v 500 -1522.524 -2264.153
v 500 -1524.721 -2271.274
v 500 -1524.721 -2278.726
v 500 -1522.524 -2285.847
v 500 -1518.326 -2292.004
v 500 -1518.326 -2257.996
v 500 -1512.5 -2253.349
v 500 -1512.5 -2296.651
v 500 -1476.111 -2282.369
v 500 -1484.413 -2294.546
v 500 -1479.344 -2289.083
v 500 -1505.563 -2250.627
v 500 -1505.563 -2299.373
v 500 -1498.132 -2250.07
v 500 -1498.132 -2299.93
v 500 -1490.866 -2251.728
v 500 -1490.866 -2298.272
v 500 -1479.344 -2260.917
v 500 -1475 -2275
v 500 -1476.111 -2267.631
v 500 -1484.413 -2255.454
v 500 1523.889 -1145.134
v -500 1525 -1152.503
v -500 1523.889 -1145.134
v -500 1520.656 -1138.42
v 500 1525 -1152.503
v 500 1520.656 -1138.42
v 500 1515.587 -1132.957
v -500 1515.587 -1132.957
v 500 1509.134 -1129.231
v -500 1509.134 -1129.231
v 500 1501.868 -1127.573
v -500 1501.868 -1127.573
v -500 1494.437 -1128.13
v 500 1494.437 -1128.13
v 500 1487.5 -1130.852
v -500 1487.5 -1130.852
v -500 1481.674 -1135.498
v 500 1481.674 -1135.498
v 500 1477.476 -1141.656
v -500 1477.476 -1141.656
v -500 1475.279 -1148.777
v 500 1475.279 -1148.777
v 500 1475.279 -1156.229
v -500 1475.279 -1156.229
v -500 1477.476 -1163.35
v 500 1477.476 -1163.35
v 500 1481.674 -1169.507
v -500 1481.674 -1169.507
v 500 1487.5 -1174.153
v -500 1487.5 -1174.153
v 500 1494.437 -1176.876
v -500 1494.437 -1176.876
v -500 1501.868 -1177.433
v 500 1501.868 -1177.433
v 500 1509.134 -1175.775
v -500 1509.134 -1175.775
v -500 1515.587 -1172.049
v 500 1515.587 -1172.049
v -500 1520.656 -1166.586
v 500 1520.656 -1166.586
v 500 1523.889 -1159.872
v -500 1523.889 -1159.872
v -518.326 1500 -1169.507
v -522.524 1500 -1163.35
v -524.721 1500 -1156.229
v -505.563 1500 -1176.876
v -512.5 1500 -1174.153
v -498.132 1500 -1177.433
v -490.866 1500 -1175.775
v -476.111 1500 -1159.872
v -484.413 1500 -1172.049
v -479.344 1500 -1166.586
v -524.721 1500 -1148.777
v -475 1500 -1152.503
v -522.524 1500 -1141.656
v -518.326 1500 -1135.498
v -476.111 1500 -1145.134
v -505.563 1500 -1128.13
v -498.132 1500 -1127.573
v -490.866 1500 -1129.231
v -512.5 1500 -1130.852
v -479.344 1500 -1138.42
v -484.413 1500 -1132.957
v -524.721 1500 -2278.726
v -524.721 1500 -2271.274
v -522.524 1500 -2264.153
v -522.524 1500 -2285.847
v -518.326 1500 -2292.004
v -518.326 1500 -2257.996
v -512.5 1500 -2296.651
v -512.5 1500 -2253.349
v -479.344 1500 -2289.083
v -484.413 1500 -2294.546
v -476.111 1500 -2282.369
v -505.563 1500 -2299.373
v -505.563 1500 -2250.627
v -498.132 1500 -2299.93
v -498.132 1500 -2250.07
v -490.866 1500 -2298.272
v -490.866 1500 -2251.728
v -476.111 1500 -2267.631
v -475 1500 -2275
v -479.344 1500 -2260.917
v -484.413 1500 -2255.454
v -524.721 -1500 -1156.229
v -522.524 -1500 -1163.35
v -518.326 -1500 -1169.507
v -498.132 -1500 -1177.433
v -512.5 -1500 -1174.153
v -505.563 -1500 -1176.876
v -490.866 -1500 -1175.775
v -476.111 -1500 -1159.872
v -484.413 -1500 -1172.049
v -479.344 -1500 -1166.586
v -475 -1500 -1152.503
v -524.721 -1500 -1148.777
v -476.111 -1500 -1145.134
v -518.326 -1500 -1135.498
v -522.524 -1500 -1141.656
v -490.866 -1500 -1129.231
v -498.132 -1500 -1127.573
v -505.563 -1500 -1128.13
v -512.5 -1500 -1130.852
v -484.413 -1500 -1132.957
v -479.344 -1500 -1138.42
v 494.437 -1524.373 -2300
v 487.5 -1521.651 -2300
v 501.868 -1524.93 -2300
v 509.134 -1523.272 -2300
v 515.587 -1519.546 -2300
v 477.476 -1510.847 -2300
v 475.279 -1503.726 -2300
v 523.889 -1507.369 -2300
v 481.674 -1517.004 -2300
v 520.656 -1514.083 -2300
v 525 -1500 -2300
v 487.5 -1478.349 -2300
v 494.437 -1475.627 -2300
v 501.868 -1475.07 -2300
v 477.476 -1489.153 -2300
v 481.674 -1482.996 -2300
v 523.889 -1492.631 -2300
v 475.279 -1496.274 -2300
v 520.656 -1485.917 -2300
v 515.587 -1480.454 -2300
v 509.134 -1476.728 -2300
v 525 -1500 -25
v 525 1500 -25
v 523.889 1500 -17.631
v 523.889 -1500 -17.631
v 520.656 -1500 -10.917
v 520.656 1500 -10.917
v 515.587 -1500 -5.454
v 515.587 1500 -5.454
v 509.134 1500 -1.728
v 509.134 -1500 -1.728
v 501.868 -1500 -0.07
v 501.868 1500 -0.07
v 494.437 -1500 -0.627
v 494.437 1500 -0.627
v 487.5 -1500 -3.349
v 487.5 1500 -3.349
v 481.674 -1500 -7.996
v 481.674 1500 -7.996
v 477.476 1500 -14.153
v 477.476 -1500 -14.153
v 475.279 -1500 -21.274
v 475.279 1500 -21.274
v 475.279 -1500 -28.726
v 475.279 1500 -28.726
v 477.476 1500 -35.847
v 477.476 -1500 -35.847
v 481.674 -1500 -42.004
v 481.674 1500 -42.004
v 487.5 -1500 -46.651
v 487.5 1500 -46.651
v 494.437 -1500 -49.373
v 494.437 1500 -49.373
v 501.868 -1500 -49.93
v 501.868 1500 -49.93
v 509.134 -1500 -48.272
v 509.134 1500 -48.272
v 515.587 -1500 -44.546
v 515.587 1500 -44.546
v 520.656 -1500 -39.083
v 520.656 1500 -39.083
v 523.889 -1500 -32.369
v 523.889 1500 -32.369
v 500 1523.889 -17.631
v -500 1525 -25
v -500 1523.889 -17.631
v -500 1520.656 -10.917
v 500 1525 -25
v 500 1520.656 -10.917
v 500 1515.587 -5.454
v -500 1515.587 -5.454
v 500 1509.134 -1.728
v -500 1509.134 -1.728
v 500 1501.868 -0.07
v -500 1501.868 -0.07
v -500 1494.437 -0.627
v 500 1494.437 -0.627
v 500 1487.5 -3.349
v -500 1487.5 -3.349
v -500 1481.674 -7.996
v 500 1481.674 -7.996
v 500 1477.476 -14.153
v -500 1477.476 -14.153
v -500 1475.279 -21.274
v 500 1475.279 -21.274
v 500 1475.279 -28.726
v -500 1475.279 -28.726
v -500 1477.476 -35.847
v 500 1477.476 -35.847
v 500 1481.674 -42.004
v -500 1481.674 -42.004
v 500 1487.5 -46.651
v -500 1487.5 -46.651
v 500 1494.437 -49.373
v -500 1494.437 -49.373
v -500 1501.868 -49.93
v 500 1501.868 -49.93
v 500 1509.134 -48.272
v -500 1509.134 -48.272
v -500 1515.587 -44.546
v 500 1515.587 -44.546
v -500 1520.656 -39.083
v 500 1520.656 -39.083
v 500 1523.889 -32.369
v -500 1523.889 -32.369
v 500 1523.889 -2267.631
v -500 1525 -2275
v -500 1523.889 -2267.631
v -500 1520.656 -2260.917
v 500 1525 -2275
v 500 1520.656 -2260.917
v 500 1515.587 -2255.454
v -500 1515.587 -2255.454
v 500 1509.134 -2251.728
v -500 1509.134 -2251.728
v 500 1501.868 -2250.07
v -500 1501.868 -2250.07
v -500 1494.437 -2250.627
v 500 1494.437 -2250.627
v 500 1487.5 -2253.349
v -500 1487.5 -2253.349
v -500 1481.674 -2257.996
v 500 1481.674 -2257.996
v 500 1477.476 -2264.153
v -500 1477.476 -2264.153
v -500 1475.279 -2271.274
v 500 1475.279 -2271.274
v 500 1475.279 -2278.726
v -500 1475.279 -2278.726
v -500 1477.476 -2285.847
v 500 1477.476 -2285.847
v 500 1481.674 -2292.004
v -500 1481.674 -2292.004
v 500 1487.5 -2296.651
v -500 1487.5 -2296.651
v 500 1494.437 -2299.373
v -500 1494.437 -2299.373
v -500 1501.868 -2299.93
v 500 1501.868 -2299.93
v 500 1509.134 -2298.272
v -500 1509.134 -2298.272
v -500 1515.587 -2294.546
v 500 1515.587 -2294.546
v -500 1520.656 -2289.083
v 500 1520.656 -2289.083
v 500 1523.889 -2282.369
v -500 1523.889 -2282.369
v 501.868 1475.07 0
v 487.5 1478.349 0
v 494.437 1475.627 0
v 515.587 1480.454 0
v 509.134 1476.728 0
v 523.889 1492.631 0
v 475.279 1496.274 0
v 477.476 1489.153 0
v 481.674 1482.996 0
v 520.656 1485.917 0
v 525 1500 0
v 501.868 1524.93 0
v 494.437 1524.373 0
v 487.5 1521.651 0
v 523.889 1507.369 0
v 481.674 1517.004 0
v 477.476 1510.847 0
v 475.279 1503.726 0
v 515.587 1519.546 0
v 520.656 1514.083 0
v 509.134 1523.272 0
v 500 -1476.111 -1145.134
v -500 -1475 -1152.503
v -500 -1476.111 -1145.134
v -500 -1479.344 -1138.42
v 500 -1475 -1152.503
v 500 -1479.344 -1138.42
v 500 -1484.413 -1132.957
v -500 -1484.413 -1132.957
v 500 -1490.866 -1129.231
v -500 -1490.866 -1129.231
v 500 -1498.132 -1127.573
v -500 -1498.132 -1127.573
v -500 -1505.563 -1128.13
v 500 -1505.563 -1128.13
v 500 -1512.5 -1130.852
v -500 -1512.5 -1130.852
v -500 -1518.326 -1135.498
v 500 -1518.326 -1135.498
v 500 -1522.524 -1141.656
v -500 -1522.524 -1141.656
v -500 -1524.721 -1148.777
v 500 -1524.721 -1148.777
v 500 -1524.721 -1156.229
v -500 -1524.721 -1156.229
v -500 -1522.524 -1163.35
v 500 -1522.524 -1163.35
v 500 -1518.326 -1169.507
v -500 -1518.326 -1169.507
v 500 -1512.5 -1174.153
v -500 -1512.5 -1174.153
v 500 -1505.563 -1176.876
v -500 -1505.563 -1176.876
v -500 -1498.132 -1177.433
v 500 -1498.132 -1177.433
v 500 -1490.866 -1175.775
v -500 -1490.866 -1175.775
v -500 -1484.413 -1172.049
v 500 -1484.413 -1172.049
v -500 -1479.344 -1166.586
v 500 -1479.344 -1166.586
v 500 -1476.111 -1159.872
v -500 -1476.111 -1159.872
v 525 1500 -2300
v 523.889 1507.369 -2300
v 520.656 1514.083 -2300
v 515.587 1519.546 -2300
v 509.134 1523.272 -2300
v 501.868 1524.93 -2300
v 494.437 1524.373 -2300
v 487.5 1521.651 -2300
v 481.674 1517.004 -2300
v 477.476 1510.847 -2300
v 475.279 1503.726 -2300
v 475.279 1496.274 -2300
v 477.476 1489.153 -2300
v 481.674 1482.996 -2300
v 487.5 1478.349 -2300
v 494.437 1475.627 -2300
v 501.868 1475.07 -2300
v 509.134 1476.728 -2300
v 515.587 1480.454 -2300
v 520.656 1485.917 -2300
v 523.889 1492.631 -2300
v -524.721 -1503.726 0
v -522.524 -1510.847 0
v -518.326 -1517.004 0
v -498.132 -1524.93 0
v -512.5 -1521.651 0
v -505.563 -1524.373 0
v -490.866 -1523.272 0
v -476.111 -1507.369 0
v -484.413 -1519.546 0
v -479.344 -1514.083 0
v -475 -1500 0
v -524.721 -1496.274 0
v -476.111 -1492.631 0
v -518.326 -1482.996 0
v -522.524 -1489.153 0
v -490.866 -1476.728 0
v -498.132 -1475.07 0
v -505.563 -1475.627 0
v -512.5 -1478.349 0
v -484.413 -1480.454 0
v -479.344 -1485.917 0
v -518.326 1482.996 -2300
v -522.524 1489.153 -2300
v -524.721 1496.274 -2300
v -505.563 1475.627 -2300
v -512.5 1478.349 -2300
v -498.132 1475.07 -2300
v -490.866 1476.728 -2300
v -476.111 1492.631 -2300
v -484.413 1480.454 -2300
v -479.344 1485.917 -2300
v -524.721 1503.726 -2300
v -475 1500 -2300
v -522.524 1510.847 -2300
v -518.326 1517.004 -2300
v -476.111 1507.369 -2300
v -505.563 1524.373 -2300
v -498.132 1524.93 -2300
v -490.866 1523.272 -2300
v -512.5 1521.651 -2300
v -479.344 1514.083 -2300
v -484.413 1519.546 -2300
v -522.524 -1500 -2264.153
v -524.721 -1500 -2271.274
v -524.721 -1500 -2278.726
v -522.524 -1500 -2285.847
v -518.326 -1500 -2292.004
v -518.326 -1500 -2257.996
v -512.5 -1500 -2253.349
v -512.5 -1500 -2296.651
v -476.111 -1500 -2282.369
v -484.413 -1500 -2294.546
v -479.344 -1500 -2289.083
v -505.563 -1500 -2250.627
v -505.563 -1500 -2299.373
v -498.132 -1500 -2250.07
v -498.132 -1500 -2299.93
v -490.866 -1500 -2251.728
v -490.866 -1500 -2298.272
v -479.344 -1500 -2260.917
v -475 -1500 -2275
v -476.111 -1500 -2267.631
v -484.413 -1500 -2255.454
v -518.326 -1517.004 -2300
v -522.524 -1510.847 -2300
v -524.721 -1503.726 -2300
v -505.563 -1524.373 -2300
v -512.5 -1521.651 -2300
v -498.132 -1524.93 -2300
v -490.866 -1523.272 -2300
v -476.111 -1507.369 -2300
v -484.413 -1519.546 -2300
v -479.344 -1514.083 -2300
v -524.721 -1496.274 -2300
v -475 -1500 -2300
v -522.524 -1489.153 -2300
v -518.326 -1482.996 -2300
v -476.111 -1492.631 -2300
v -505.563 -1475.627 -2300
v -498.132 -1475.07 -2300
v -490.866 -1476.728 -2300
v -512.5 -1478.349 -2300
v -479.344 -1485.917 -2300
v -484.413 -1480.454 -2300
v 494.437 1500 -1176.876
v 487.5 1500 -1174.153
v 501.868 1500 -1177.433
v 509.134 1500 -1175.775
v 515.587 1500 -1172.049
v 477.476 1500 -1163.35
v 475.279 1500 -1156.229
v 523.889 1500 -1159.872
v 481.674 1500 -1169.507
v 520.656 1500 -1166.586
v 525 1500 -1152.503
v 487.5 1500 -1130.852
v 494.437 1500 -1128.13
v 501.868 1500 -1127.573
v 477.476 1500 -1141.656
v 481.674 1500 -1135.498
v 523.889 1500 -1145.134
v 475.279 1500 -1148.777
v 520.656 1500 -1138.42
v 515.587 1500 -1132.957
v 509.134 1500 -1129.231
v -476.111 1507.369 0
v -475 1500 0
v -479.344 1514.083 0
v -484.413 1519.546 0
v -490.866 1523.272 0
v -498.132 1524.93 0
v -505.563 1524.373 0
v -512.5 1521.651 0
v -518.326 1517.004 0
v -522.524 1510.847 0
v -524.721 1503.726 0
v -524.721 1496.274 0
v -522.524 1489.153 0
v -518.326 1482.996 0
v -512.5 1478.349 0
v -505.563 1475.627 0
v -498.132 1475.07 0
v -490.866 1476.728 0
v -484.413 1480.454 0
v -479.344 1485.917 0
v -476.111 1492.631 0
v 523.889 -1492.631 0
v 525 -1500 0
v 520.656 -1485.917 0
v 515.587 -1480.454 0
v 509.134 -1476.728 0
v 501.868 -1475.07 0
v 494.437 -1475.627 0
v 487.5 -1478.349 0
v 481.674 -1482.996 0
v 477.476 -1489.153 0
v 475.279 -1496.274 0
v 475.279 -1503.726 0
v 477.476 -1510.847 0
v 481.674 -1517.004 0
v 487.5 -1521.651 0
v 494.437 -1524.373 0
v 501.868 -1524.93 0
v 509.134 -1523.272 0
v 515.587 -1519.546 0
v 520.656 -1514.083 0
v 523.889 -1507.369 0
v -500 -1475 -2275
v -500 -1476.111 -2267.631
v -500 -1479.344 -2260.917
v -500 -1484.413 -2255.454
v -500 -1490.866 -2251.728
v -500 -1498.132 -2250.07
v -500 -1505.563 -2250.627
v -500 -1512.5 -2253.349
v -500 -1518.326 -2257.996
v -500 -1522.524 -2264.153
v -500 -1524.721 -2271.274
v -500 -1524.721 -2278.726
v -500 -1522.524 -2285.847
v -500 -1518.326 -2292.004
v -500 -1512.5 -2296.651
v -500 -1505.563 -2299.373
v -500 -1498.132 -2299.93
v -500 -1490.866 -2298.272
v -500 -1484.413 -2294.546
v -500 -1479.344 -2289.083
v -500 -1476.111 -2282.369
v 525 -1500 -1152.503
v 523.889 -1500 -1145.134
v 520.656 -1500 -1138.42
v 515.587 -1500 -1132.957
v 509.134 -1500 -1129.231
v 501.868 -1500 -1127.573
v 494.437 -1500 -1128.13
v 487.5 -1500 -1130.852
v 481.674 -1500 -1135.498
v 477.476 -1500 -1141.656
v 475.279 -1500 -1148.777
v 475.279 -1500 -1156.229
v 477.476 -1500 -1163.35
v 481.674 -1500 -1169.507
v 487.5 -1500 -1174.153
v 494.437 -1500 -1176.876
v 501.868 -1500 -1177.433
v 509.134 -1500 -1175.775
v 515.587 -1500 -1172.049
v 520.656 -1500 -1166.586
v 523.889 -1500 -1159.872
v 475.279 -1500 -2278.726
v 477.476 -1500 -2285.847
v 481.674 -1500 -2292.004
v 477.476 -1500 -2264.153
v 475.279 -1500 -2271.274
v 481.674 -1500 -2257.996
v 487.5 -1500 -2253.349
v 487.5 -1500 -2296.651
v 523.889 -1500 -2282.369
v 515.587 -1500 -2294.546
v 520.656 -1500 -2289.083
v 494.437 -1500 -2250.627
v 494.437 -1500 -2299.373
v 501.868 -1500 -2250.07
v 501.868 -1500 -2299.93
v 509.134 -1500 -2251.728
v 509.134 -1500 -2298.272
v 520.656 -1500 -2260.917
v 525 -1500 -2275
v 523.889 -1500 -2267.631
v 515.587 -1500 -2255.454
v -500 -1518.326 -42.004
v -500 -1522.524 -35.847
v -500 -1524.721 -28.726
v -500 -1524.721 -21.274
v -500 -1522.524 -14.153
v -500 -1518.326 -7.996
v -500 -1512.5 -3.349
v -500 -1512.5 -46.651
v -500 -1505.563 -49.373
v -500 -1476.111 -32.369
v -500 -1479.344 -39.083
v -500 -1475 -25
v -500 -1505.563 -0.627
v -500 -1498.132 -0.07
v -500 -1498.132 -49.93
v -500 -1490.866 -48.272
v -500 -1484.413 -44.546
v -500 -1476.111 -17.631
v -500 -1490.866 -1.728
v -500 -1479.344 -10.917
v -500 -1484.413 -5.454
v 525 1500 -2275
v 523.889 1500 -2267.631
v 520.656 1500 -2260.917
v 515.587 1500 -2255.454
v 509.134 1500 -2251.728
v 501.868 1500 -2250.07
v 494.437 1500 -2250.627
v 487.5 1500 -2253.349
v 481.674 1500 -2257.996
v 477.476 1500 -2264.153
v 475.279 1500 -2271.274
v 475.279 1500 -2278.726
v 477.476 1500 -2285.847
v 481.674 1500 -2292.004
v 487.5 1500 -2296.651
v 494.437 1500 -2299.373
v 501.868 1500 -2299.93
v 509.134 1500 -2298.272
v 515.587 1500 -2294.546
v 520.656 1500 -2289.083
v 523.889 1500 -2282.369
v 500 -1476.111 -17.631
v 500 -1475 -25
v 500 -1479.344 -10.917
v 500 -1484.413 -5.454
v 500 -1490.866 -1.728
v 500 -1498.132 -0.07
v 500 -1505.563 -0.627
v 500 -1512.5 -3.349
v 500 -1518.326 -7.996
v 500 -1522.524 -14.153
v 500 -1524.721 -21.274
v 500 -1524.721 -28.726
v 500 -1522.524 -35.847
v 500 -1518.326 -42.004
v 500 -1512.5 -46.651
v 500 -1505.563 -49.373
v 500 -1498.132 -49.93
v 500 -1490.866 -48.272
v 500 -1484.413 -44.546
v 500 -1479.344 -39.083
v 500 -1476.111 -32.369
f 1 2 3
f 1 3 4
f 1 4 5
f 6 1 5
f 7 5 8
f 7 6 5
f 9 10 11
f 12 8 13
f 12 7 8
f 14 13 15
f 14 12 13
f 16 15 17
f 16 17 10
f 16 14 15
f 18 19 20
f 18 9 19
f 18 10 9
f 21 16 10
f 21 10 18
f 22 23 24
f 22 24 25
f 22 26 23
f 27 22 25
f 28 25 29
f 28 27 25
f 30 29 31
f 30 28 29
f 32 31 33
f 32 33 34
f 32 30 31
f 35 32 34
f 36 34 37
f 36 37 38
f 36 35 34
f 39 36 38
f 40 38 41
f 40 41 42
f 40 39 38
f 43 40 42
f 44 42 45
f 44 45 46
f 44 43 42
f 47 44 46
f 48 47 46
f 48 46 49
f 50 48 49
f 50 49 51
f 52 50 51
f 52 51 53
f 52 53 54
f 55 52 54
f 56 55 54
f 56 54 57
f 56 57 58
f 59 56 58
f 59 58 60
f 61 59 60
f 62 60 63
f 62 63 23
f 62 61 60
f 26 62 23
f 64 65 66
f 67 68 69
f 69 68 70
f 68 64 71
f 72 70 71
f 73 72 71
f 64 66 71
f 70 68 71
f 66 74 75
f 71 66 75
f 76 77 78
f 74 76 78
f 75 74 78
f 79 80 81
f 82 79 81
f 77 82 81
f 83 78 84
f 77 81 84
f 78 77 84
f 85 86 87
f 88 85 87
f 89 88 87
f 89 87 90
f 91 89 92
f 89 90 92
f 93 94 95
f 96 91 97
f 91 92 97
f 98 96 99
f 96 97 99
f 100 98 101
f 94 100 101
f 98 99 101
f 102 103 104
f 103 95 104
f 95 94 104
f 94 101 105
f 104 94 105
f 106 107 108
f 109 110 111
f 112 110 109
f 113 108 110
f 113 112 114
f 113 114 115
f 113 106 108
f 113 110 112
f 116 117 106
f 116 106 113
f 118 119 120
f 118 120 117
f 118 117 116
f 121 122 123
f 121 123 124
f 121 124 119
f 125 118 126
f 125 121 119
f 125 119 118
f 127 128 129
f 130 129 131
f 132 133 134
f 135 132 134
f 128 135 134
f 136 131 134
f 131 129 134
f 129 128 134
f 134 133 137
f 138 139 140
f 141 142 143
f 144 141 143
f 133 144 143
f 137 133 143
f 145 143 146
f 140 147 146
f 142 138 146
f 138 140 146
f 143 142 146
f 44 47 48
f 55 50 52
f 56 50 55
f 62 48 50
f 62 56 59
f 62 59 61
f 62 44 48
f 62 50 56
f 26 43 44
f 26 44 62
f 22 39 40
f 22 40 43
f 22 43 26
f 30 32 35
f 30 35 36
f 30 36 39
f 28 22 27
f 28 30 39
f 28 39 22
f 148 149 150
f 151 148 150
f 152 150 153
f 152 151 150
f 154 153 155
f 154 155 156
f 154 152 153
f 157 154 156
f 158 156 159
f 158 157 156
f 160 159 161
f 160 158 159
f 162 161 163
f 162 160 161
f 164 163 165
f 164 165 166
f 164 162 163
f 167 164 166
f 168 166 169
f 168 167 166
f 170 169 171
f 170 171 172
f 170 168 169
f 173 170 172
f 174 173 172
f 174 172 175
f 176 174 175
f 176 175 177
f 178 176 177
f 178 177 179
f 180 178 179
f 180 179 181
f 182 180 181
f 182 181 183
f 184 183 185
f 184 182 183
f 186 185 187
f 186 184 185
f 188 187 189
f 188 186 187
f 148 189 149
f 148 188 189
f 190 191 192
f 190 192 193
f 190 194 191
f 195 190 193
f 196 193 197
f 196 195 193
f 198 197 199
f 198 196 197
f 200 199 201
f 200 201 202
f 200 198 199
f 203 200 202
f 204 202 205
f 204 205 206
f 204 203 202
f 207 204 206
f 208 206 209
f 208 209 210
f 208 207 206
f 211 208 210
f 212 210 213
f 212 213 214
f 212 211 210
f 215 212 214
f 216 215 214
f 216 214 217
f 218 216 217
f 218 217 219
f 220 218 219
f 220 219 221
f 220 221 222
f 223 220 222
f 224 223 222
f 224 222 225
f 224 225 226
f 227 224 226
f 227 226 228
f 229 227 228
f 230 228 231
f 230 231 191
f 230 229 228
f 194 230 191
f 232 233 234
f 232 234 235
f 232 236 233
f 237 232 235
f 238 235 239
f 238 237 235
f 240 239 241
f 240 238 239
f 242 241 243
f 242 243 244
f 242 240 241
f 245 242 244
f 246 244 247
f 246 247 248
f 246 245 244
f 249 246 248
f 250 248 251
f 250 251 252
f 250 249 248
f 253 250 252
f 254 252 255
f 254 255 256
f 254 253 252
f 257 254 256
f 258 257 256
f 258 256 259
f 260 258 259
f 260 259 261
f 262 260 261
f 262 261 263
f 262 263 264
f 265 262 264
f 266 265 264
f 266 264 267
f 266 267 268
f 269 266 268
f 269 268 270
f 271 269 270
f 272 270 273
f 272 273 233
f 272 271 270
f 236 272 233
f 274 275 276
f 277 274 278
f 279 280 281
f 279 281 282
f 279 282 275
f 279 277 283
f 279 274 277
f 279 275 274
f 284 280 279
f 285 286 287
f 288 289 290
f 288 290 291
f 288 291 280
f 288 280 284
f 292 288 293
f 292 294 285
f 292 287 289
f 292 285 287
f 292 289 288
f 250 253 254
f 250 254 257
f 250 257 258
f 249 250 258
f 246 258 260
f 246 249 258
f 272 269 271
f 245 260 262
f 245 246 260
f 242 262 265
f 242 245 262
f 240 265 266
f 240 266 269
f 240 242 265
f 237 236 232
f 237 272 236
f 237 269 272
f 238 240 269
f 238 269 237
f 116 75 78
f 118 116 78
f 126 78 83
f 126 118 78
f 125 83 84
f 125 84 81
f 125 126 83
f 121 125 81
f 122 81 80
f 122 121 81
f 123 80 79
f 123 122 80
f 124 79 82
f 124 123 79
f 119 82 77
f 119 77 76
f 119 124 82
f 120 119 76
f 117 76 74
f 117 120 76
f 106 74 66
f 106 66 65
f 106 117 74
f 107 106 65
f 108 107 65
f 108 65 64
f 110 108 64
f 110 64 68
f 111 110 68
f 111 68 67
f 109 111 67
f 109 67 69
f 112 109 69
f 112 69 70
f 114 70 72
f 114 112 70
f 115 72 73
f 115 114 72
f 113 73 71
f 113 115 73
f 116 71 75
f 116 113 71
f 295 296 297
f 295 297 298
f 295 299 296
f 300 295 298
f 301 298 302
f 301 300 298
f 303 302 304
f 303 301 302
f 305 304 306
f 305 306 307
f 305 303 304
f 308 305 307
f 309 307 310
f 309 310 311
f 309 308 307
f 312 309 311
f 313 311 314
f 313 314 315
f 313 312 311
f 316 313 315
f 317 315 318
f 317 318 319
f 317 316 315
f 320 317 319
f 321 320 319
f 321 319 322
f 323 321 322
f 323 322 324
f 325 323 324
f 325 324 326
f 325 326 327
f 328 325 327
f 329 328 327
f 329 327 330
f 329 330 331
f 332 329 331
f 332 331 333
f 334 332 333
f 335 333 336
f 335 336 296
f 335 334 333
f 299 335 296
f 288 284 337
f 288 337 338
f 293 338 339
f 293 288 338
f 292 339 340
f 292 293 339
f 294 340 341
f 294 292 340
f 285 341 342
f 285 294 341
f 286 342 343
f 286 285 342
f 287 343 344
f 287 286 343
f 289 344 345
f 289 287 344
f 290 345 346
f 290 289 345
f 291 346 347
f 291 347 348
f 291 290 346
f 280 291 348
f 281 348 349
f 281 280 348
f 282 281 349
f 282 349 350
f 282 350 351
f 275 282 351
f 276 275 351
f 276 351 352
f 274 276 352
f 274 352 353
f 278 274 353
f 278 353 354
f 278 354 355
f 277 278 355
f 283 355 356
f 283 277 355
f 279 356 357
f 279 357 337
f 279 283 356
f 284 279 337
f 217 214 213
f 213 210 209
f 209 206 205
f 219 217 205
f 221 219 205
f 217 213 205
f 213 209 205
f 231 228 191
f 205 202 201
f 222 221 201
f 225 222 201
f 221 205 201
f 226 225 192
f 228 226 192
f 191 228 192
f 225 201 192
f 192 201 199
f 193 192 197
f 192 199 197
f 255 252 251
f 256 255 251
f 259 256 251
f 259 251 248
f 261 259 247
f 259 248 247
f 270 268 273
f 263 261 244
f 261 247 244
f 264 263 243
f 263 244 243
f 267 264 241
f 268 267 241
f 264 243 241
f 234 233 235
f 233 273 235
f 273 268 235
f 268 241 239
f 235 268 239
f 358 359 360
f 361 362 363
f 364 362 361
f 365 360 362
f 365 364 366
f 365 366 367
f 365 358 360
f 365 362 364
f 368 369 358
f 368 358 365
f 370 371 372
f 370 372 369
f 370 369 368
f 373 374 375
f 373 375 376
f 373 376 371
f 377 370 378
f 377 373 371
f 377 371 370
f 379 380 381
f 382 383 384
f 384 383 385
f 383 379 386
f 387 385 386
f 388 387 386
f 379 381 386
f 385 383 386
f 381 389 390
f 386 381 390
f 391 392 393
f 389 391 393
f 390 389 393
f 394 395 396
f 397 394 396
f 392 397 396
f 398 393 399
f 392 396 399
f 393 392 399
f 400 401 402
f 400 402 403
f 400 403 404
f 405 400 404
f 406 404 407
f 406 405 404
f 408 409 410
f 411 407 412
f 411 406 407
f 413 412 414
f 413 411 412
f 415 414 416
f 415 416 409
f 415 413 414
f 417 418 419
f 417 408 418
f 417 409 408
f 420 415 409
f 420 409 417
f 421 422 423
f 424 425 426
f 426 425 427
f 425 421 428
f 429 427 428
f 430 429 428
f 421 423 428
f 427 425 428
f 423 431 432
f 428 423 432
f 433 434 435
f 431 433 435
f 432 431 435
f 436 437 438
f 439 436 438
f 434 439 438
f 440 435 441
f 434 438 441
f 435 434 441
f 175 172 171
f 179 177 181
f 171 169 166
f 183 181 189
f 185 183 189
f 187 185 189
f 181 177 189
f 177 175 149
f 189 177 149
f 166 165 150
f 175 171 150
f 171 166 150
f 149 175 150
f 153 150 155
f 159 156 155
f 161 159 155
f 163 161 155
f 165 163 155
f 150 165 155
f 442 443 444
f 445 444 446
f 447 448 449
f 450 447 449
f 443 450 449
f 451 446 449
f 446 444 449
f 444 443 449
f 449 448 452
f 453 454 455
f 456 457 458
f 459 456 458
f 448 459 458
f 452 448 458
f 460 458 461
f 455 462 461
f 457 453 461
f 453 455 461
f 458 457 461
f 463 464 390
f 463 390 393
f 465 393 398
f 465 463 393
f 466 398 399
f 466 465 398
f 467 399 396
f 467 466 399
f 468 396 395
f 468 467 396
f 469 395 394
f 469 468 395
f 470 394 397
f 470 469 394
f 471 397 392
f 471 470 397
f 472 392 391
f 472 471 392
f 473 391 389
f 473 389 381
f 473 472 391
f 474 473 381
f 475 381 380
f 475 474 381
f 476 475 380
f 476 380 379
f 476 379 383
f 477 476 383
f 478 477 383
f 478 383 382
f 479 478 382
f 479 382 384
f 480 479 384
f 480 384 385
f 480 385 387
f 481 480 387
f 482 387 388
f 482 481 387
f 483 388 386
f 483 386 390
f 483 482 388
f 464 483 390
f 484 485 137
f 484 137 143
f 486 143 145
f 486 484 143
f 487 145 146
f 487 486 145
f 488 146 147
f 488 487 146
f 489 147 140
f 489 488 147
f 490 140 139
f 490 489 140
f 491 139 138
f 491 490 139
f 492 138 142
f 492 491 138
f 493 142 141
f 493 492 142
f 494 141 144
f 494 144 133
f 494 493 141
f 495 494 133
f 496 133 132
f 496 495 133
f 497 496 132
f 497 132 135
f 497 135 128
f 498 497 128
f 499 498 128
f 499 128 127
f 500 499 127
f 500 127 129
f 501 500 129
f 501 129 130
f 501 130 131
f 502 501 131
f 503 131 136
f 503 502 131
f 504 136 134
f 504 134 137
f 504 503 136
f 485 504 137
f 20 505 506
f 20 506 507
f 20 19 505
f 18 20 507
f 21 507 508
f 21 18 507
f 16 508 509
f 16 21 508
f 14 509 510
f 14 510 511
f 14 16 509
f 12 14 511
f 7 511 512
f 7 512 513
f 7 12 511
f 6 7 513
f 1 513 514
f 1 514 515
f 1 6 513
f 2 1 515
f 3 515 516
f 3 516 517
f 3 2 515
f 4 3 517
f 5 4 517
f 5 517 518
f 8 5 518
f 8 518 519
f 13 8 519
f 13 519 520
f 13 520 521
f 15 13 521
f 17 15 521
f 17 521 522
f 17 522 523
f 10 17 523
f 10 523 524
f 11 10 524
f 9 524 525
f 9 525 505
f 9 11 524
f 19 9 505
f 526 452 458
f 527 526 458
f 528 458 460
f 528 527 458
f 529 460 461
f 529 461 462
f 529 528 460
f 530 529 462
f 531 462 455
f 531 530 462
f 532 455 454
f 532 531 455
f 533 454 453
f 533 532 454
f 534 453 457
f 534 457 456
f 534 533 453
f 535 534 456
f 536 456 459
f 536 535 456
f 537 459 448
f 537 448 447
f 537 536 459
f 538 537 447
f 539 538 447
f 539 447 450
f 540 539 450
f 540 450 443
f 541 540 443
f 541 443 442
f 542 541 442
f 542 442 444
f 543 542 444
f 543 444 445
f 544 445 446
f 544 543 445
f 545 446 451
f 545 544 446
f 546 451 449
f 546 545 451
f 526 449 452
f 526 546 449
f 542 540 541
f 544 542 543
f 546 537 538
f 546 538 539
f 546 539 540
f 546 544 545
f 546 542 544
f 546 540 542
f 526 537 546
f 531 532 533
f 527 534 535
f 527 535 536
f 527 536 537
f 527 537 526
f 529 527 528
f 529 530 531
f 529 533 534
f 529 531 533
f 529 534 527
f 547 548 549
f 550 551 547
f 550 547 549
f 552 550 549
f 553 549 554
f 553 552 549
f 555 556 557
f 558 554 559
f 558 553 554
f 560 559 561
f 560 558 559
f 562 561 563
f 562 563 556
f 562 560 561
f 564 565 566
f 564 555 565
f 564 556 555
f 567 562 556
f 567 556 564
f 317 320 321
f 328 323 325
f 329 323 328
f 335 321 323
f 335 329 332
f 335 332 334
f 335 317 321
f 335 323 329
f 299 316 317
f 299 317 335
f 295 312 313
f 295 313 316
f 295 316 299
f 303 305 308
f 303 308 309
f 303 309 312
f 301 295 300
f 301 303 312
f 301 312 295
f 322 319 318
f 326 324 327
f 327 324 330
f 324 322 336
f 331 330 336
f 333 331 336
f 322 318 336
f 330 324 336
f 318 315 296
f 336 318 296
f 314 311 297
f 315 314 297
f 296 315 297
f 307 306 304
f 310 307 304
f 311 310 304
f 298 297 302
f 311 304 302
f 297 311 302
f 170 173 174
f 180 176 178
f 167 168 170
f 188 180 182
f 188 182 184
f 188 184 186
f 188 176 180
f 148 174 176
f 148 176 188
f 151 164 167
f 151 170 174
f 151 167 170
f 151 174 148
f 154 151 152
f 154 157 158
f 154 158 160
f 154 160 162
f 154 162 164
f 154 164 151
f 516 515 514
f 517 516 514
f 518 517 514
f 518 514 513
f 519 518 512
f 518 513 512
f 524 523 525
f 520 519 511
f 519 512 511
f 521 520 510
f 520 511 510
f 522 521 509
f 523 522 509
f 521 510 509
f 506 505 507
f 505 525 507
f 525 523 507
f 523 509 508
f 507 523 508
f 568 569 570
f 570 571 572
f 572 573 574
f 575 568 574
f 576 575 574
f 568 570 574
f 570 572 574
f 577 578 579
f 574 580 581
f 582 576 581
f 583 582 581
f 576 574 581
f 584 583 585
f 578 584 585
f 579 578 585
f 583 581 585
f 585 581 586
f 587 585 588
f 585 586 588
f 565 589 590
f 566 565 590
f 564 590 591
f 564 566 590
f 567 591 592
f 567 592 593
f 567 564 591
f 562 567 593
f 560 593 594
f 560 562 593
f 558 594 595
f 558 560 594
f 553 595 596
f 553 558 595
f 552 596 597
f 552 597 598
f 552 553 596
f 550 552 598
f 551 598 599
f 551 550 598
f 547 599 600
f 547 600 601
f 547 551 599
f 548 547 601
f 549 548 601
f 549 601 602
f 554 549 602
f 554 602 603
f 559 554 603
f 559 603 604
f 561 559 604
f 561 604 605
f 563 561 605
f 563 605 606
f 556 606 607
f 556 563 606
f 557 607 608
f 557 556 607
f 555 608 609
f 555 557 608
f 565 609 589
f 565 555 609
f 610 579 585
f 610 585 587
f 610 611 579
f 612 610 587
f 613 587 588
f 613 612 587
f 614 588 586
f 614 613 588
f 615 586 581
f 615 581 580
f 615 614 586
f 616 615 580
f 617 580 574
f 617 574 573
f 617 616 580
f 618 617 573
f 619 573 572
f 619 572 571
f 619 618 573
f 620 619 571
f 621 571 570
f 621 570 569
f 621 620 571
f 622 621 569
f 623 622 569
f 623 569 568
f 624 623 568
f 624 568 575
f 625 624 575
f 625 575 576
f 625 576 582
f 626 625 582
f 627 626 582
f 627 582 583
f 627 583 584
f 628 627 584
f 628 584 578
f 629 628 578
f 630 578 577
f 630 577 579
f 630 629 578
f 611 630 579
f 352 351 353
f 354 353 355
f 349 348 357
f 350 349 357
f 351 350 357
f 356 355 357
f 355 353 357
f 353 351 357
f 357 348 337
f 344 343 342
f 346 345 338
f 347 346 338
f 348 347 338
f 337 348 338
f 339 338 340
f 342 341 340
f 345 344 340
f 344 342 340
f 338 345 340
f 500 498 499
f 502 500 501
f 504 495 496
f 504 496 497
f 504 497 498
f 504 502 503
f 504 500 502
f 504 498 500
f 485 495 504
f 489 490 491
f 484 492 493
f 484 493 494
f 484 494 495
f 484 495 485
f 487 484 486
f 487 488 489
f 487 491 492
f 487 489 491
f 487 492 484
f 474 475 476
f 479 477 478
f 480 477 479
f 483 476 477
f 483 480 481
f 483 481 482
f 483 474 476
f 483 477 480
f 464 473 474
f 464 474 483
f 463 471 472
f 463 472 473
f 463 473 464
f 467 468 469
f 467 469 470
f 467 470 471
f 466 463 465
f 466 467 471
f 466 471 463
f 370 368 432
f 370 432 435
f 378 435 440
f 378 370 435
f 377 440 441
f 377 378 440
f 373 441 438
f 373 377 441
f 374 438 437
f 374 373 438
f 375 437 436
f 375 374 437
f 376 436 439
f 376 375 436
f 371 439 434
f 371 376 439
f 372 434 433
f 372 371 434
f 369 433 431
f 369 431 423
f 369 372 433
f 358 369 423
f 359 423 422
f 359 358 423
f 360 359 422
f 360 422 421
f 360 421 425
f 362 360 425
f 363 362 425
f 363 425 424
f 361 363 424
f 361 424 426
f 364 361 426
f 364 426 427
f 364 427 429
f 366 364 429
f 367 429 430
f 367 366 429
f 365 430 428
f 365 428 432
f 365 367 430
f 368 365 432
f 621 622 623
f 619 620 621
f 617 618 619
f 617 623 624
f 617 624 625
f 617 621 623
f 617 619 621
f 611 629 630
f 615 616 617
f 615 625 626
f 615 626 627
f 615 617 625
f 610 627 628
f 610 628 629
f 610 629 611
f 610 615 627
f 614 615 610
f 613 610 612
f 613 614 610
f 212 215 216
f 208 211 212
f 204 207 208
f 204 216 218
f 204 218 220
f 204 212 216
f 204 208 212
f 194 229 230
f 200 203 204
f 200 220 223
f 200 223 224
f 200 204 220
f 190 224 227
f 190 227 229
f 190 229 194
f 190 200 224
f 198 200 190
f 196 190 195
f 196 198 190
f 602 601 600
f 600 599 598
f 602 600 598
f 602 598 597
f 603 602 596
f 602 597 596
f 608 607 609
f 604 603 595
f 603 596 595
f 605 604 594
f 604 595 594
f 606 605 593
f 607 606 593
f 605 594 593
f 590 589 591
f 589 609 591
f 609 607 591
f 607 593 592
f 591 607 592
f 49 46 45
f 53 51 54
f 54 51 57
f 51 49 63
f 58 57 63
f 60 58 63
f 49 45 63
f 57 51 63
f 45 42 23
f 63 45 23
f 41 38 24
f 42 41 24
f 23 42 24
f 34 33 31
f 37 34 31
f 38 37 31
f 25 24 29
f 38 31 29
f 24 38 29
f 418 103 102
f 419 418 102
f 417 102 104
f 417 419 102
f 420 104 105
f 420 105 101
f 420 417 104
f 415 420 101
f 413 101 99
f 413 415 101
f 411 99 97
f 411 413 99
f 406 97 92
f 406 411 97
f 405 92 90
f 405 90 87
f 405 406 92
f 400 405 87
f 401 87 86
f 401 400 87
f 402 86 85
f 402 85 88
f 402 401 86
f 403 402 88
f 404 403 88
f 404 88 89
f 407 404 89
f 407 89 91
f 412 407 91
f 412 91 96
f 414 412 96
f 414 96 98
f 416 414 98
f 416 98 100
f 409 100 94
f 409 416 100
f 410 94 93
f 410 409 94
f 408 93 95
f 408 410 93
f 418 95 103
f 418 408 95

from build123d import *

# Parameters (mm, degrees)
F1_R          = 25
F2_DEPTH      = 2300
F3_R          = 25
F4_DEPTH      = 1500
F4_DEPTH_BACK = 1500
F5_R          = 25
F6_DEPTH      = 500
F6_DEPTH_BACK = 500
F7_R          = 25
F8_DEPTH      = 500
F8_DEPTH_BACK = 500


with BuildPart() as f2:
    # F1 (on Top) → F2 (new body)
    with BuildSketch(Plane.XY):
        with Locations((-500, 1500)):
            Circle(F1_R)
        with Locations((500, 1500)):
            Circle(F1_R)
        with Locations((500, -1500)):
            Circle(F1_R)
        with Locations((-500, -1500)):
            Circle(F1_R)
    extrude(amount=-F2_DEPTH)


with BuildPart() as f4:
    # F3 (on Front) → F4 (new body, two sides)
    with BuildSketch(Plane.XZ) as f4_sk:
        with Locations((500, -2275)):
            Circle(F3_R)
        with Locations((-500, -2275)):
            Circle(F3_R)
        with Locations((500, -25)):
            Circle(F3_R)
        with Locations((500, -1152.502756)):
            Circle(F3_R)
        with Locations((-500, -1152.502756)):
            Circle(F3_R)
    extrude(amount=F4_DEPTH)
    extrude(f4_sk.sketch, amount=-F4_DEPTH_BACK)


with BuildPart() as f6:
    # F5 (on face) → F6 (new body, two sides)
    with BuildSketch(Plane.YZ) as f6_sk:
        with Locations((-1500, -2275)):
            Circle(F5_R)
        with Locations((1500, -2275)):
            Circle(F5_R)
        with Locations((1500, -25)):
            Circle(F5_R)
        with Locations((-1500, -25)):
            Circle(F5_R)
    extrude(amount=F6_DEPTH)
    extrude(f6_sk.sketch, amount=-F6_DEPTH_BACK)


with BuildPart() as f8:
    # F7 (on face) → F8 (new body, two sides)
    with BuildSketch(Plane.YZ) as f8_sk:
        with Locations((-1500, -1152.502756)):
            Circle(F7_R)
        with Locations((1500, -1152.502756)):
            Circle(F7_R)
    extrude(amount=F8_DEPTH)
    extrude(f8_sk.sketch, amount=-F8_DEPTH_BACK)


solid = Compound([f2.part, f4.part, f6.part, f8.part])
